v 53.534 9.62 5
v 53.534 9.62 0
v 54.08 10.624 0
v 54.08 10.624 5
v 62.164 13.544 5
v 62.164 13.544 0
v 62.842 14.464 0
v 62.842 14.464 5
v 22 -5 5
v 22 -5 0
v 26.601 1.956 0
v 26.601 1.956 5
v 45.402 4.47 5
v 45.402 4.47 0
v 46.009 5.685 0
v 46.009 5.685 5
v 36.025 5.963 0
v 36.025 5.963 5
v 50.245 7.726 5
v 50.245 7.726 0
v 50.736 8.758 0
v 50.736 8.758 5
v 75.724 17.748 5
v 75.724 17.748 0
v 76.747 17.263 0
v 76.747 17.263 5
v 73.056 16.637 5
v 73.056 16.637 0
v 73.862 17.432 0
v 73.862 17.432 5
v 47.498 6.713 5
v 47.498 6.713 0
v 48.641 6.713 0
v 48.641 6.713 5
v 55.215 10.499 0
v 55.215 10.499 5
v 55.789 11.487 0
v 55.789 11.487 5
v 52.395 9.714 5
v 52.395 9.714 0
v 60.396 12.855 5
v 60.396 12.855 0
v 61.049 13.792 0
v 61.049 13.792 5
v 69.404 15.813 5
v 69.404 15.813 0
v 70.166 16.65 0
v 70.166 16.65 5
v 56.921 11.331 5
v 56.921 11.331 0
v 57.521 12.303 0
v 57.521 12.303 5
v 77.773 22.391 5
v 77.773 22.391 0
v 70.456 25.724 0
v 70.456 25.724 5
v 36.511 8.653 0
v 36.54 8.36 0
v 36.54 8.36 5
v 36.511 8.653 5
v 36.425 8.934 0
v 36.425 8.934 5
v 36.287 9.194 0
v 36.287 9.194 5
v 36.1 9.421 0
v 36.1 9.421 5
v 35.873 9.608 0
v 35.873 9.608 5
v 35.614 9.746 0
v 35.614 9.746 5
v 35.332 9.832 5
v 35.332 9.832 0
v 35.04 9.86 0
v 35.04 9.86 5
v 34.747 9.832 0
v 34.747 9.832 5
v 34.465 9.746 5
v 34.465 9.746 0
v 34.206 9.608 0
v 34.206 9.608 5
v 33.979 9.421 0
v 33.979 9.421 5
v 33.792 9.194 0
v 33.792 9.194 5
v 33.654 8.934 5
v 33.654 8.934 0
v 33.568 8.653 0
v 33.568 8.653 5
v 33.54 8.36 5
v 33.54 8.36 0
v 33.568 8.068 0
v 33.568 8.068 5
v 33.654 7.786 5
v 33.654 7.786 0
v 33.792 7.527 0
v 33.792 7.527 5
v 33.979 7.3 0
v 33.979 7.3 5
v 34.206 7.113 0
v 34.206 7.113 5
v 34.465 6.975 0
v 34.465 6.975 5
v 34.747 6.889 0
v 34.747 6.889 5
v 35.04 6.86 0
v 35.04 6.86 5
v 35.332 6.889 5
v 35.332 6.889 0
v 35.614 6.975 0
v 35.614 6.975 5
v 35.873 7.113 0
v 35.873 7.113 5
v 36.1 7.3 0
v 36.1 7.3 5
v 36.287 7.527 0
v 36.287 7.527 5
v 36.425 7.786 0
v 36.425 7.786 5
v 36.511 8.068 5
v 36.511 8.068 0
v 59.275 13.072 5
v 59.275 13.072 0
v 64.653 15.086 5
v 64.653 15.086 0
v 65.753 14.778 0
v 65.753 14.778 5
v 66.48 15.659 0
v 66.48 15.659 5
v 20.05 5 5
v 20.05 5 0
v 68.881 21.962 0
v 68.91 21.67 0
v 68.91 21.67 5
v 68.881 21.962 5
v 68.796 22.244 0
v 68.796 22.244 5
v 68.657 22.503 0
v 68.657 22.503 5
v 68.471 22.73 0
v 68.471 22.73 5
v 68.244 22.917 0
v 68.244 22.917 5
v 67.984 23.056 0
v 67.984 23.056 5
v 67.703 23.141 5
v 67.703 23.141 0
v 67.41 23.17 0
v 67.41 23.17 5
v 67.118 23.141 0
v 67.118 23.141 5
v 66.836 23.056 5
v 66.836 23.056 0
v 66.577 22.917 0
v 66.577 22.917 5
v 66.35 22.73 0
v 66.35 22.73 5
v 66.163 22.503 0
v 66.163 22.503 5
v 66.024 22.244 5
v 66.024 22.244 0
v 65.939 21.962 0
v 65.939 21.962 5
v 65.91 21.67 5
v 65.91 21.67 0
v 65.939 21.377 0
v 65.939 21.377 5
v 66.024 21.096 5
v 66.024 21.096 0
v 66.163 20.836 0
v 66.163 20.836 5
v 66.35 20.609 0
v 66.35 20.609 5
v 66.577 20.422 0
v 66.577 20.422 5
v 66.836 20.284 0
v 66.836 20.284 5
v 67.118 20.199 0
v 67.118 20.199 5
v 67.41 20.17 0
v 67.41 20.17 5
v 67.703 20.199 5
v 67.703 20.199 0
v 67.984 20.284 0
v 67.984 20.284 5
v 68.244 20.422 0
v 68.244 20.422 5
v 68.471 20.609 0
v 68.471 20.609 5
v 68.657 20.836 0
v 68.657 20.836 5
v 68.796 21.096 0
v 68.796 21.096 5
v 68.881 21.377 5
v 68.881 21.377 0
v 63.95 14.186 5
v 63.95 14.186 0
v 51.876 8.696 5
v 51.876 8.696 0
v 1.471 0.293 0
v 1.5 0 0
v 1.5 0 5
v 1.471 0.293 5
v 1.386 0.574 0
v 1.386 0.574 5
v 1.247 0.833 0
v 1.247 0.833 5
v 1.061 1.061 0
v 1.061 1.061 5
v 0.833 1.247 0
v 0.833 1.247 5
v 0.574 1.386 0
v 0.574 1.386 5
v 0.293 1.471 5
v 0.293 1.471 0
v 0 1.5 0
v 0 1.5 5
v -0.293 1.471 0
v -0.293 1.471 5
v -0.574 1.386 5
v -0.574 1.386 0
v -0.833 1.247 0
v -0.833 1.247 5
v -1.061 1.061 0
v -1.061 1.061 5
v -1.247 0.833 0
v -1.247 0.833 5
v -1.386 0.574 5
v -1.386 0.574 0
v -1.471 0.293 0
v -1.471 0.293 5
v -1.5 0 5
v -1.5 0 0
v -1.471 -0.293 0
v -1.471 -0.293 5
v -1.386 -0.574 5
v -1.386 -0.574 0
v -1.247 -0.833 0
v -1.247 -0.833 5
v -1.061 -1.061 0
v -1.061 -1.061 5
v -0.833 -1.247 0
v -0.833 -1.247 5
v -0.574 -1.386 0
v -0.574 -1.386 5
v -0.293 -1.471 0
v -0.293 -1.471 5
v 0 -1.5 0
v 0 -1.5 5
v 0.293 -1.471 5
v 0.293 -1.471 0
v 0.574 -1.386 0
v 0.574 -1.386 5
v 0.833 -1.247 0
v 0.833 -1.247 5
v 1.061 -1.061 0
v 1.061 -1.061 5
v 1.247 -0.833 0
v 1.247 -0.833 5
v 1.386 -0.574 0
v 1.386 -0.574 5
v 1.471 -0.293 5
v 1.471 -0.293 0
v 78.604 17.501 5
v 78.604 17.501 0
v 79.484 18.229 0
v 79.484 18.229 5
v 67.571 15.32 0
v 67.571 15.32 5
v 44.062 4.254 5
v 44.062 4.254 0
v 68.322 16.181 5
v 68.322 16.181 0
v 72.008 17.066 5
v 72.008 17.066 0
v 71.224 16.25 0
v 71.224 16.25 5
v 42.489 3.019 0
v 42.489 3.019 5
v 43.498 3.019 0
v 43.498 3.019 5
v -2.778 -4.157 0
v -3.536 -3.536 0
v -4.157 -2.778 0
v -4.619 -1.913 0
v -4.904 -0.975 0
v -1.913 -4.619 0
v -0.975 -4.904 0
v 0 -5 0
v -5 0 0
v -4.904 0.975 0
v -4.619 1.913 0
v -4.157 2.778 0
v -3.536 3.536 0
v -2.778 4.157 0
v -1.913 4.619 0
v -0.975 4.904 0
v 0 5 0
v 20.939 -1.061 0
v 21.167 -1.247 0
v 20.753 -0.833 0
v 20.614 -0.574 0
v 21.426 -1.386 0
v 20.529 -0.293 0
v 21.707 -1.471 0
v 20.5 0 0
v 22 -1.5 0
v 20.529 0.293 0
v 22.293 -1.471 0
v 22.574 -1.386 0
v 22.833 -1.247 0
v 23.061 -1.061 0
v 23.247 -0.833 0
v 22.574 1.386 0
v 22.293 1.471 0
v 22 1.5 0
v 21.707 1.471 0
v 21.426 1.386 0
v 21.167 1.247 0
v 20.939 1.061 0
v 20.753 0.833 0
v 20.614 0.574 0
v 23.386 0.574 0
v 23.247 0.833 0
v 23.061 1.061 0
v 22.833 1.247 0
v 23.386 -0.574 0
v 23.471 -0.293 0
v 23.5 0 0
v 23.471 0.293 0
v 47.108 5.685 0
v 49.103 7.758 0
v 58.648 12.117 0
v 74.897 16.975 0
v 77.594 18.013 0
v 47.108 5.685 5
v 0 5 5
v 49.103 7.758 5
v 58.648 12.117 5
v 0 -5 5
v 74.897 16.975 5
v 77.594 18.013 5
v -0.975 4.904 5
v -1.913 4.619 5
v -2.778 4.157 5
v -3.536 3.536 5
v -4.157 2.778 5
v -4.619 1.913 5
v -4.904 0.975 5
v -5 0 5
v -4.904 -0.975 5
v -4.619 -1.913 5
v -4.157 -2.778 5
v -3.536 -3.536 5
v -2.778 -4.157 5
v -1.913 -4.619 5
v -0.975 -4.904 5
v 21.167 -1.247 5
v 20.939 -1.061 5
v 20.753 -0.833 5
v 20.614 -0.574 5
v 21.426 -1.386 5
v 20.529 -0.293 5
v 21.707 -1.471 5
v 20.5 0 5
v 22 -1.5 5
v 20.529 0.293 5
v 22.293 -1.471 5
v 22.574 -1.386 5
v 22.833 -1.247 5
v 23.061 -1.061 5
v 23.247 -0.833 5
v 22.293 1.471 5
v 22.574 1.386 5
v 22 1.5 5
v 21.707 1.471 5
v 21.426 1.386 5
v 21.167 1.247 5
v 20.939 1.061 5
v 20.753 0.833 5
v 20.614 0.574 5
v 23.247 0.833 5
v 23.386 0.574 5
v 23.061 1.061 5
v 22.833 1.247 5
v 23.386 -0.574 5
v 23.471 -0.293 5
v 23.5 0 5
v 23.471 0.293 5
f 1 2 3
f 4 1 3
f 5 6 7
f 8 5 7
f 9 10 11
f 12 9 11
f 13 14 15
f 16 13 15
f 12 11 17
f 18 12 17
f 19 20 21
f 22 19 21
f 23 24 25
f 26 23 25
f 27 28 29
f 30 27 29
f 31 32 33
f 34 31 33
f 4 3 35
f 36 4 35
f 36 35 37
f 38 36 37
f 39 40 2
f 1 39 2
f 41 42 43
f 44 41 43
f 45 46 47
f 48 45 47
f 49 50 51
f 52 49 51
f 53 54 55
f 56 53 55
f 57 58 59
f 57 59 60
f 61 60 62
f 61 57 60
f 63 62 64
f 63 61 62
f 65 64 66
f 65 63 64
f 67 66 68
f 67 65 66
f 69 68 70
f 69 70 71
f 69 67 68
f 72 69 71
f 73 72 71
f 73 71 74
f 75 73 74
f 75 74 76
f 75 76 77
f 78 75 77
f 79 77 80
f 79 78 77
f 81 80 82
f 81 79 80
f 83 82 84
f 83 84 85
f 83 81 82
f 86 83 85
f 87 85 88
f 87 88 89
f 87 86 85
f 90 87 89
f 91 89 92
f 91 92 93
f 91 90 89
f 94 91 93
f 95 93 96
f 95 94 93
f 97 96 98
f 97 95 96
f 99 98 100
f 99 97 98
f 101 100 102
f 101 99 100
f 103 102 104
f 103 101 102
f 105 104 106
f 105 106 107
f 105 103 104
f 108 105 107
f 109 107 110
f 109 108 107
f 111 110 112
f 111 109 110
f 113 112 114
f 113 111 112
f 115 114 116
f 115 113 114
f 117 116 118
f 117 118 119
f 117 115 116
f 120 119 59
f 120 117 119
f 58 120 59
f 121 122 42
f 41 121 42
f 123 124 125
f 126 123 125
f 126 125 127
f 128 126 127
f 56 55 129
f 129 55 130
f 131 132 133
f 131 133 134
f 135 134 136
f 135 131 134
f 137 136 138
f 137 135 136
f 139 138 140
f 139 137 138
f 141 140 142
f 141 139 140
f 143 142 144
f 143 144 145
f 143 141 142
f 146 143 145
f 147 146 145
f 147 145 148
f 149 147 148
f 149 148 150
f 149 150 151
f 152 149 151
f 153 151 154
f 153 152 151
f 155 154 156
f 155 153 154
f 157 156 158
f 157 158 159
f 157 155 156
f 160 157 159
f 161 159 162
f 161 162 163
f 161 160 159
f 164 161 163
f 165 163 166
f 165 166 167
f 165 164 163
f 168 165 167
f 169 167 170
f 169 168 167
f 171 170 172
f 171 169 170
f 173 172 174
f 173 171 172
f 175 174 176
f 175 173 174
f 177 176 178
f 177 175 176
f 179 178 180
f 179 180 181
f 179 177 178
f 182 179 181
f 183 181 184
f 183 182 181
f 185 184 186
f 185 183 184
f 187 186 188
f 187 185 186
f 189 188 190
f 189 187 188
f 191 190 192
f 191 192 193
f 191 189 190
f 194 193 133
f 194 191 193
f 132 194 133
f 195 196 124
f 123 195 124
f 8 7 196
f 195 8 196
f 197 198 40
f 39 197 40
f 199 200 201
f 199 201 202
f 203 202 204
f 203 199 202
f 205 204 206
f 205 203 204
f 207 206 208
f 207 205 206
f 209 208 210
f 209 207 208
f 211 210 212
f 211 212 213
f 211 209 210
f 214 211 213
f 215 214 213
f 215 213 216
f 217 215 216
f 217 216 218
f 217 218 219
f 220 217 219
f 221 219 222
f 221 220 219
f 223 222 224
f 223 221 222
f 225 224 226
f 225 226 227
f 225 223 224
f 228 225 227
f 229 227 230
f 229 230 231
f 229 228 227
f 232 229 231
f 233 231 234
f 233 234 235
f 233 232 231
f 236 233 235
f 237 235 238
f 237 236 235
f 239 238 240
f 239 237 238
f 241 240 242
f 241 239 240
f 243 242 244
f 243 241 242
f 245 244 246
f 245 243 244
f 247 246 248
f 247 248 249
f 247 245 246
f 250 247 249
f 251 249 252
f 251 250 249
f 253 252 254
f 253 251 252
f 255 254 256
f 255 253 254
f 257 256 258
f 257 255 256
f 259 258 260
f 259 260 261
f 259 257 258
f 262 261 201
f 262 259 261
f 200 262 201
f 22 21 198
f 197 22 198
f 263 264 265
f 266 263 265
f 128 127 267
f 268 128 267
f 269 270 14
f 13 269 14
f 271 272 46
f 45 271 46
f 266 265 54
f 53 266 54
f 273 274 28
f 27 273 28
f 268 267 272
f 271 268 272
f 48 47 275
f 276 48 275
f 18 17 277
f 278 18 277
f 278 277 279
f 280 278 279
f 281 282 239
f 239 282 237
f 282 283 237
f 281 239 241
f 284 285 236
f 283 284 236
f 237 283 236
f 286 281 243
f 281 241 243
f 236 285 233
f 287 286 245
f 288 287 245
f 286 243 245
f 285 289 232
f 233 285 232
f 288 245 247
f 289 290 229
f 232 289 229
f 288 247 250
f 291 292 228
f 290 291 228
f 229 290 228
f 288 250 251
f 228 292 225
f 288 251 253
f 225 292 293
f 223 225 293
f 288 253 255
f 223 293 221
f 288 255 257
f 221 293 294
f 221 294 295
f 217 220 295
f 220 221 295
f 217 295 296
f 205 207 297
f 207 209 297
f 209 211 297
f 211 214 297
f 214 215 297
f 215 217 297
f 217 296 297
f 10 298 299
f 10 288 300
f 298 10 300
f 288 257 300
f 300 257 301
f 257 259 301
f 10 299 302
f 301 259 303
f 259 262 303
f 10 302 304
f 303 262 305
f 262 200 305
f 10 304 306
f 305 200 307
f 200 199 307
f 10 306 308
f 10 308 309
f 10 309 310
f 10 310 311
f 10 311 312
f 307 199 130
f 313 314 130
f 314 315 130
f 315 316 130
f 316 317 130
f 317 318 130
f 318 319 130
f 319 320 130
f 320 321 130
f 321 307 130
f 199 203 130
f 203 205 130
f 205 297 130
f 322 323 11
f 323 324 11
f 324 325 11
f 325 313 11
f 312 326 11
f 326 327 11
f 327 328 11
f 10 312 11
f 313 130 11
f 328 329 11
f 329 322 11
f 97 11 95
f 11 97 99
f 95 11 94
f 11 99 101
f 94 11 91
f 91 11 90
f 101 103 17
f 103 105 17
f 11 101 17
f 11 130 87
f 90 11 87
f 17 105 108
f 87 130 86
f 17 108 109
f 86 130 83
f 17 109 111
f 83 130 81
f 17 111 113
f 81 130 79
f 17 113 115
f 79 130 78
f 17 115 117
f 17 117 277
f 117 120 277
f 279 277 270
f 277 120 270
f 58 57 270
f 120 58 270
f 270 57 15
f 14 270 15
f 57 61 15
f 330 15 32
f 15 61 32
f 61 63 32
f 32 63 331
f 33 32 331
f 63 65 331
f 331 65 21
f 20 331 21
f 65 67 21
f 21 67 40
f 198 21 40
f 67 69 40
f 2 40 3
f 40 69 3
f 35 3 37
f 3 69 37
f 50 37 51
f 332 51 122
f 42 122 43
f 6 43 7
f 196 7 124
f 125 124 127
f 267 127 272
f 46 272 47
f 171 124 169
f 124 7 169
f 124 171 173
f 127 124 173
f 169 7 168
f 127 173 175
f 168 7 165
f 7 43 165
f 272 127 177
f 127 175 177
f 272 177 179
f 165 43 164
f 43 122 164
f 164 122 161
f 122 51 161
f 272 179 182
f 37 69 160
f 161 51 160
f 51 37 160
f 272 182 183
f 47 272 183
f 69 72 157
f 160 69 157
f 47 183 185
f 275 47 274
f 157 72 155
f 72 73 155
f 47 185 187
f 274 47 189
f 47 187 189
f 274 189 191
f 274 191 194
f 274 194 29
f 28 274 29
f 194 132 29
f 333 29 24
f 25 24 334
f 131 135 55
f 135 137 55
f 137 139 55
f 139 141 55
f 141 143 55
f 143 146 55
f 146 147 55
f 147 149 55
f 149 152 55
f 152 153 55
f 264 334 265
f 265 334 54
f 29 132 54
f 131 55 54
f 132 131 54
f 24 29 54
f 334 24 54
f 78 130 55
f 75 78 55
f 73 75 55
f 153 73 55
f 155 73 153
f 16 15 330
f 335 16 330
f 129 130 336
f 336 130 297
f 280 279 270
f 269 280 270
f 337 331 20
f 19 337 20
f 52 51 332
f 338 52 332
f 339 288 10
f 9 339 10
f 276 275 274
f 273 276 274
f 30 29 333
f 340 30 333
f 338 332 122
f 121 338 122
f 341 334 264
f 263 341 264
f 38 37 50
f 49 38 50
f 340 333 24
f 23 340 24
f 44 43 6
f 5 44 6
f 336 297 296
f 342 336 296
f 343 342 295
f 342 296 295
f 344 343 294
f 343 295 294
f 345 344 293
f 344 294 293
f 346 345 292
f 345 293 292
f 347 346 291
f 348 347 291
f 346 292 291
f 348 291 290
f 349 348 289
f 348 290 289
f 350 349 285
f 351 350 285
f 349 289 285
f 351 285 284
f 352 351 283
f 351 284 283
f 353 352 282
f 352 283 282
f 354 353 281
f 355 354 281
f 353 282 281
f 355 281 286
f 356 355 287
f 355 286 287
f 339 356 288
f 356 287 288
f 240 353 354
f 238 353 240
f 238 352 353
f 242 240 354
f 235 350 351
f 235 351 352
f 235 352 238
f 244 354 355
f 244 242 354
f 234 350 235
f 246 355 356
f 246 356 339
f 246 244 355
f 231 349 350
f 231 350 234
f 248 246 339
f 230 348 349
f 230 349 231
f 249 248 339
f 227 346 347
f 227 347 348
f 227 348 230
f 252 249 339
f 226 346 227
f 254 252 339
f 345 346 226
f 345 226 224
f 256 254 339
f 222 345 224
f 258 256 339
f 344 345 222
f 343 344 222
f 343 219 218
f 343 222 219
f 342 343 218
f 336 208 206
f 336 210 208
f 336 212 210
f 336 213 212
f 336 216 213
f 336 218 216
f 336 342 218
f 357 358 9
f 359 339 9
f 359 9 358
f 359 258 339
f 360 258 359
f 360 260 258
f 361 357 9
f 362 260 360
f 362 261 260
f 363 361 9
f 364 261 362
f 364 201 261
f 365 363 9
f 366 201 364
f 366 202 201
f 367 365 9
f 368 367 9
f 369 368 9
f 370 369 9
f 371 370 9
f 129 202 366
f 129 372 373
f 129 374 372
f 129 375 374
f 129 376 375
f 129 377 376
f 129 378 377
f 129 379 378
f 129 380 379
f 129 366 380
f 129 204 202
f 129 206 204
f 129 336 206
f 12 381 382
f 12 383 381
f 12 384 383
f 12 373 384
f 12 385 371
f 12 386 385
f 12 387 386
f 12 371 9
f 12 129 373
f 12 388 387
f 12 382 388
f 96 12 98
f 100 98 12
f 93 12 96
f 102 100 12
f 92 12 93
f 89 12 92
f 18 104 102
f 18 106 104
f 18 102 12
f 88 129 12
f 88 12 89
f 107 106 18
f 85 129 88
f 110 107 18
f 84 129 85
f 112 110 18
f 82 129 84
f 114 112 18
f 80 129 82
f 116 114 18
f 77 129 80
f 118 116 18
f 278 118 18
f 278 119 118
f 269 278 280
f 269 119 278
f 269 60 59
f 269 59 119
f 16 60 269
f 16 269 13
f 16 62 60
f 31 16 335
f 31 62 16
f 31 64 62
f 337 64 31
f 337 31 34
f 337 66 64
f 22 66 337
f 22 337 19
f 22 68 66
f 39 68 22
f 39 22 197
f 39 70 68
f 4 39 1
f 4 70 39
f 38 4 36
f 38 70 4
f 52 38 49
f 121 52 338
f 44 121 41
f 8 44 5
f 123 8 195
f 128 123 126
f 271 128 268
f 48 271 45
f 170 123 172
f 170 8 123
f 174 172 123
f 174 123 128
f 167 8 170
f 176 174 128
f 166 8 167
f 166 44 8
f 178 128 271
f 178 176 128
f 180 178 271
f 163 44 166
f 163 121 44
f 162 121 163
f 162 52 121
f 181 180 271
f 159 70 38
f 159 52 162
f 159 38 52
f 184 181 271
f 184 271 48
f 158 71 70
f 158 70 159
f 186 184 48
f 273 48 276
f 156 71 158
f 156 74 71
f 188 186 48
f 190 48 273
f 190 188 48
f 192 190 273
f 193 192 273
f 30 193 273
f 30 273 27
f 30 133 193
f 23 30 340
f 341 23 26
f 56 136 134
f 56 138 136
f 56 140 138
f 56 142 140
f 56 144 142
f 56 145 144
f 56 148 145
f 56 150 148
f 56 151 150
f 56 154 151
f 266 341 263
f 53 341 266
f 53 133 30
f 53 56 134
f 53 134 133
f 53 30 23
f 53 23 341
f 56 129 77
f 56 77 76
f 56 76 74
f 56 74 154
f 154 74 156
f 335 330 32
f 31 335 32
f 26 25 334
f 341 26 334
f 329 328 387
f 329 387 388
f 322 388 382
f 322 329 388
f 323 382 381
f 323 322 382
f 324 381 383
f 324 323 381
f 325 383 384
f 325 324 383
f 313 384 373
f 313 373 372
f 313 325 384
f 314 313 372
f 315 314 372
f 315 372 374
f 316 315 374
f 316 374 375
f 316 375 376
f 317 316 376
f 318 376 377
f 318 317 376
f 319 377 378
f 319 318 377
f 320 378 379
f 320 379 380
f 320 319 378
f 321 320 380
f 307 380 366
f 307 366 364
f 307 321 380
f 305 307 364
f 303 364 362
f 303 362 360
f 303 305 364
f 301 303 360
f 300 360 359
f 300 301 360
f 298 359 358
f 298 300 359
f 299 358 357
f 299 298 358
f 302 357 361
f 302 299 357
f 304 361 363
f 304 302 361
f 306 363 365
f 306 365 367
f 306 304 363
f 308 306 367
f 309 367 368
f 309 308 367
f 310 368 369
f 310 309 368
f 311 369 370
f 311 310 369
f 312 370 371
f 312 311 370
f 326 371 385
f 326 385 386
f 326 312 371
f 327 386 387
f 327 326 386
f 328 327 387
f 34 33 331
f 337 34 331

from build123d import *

# Parameters (mm, degrees)
SKETCH_1_R      = 1.5
EXTRUDE_1_DEPTH = 5


with BuildPart() as part:
    # 스케치1 → 보스-돌출1 (new body)
    with BuildSketch(Plane.XY):
        with BuildLine():
            Line((20.05, 5), (0, 5))
            ThreePointArc((0, 5), (-5, 0), (0, -5))
            Line((0, -5), (22, -5))
            Line((22, -5), (26.601353767, 1.956410875))
            Line((26.601353767, 1.956410875), (36.025134241, 5.963228766))
            Line((36.025134241, 5.963228766), (42.488975113, 3.018953392))
            Line((42.488975113, 3.018953392), (43.498164032, 3.018953392))
            Line((43.498164032, 3.018953392), (44.062133892, 4.253931713))
            Line((44.062133892, 4.253931713), (45.402427297, 4.470373499))
            Line((45.402427297, 4.470373499), (46.008680673, 5.685153438))
            Line((46.008680673, 5.685153438), (47.107948843, 5.685153438))
            Line((47.107948843, 5.685153438), (47.498446434, 6.712724429))
            Line((47.498446434, 6.712724429), (48.640951743, 6.712724429))
            Line((48.640951743, 6.712724429), (49.103035082, 7.757615508))
            Line((49.103035082, 7.757615508), (50.245112942, 7.726365831))
            Line((50.245112942, 7.726365831), (50.735603144, 8.758227131))
            Line((50.735603144, 8.758227131), (51.876398977, 8.69575116))
            Line((51.876398977, 8.69575116), (52.394929025, 9.713810574))
            Line((52.394929025, 9.713810574), (53.533589213, 9.620155058))
            Line((53.533589213, 9.620155058), (54.079771108, 10.623650806))
            Line((54.079771108, 10.623650806), (55.215443631, 10.498885825))
            Line((55.215443631, 10.498885825), (55.788868685, 11.487067026))
            Line((55.788868685, 11.487067026), (56.920703758, 11.331285936))
            Line((56.920703758, 11.331285936), (57.520942896, 12.303413169))
            Line((57.520942896, 12.303413169), (58.648093605, 12.116732536))
            Line((58.648093605, 12.116732536), (59.274697688, 13.072078391))
            Line((59.274697688, 13.072078391), (60.396320625, 12.854637901))
            Line((60.396320625, 12.854637901), (61.048820788, 13.792487525))
            Line((61.048820788, 13.792487525), (62.164076682, 13.544449883))
            Line((62.164076682, 13.544449883), (62.84198468, 14.464101515))
            Line((62.84198468, 14.464101515), (63.950039022, 14.185652318))
            Line((63.950039022, 14.185652318), (64.652847601, 15.086417815))
            Line((64.652847601, 15.086417815), (65.752871272, 14.777765417))
            Line((65.752871272, 14.777765417), (66.480054544, 15.658970767))
            Line((66.480054544, 15.658970767), (67.571224435, 15.320346122))
            Line((67.571224435, 15.320346122), (68.322238273, 16.181331949))
            Line((68.322238273, 16.181331949), (69.403737898, 15.812988438))
            Line((69.403737898, 15.812988438), (70.165521035, 16.650113087))
            Line((70.165521035, 16.650113087), (71.224188399, 16.249719983))
            Line((71.224188399, 16.249719983), (72.008283749, 17.065983242))
            Line((72.008283749, 17.065983242), (73.055761076, 16.637168043))
            Line((73.055761076, 16.637168043), (73.861597574, 17.431975419))
            Line((73.861597574, 17.431975419), (74.897121975, 16.975050435))
            Line((74.897121975, 16.975050435), (75.724112721, 17.74782306))
            Line((75.724112721, 17.74782306), (76.746930013, 17.263121075))
            Line((76.746930013, 17.263121075), (77.594472701, 18.013296132))
            Line((77.594472701, 18.013296132), (78.603837954, 17.501170159))
            Line((78.603837954, 17.501170159), (79.484104239, 18.229489901))
            Line((79.484104239, 18.229489901), (77.772918882, 22.391441928))
            Line((77.772918882, 22.391441928), (70.455863435, 25.724355994))
            Line((70.455863435, 25.724355994), (20.05, 5))
        make_face()
        with Locations((35.039512437, 8.36046215)):
            Circle(SKETCH_1_R, mode=Mode.SUBTRACT)
        Circle(SKETCH_1_R, mode=Mode.SUBTRACT)
        with Locations((22, 0)):
            Circle(SKETCH_1_R, mode=Mode.SUBTRACT)
        with Locations((67.410250422, 21.669681595)):
            Circle(SKETCH_1_R, mode=Mode.SUBTRACT)
    extrude(amount=EXTRUDE_1_DEPTH)


solid = part.part
